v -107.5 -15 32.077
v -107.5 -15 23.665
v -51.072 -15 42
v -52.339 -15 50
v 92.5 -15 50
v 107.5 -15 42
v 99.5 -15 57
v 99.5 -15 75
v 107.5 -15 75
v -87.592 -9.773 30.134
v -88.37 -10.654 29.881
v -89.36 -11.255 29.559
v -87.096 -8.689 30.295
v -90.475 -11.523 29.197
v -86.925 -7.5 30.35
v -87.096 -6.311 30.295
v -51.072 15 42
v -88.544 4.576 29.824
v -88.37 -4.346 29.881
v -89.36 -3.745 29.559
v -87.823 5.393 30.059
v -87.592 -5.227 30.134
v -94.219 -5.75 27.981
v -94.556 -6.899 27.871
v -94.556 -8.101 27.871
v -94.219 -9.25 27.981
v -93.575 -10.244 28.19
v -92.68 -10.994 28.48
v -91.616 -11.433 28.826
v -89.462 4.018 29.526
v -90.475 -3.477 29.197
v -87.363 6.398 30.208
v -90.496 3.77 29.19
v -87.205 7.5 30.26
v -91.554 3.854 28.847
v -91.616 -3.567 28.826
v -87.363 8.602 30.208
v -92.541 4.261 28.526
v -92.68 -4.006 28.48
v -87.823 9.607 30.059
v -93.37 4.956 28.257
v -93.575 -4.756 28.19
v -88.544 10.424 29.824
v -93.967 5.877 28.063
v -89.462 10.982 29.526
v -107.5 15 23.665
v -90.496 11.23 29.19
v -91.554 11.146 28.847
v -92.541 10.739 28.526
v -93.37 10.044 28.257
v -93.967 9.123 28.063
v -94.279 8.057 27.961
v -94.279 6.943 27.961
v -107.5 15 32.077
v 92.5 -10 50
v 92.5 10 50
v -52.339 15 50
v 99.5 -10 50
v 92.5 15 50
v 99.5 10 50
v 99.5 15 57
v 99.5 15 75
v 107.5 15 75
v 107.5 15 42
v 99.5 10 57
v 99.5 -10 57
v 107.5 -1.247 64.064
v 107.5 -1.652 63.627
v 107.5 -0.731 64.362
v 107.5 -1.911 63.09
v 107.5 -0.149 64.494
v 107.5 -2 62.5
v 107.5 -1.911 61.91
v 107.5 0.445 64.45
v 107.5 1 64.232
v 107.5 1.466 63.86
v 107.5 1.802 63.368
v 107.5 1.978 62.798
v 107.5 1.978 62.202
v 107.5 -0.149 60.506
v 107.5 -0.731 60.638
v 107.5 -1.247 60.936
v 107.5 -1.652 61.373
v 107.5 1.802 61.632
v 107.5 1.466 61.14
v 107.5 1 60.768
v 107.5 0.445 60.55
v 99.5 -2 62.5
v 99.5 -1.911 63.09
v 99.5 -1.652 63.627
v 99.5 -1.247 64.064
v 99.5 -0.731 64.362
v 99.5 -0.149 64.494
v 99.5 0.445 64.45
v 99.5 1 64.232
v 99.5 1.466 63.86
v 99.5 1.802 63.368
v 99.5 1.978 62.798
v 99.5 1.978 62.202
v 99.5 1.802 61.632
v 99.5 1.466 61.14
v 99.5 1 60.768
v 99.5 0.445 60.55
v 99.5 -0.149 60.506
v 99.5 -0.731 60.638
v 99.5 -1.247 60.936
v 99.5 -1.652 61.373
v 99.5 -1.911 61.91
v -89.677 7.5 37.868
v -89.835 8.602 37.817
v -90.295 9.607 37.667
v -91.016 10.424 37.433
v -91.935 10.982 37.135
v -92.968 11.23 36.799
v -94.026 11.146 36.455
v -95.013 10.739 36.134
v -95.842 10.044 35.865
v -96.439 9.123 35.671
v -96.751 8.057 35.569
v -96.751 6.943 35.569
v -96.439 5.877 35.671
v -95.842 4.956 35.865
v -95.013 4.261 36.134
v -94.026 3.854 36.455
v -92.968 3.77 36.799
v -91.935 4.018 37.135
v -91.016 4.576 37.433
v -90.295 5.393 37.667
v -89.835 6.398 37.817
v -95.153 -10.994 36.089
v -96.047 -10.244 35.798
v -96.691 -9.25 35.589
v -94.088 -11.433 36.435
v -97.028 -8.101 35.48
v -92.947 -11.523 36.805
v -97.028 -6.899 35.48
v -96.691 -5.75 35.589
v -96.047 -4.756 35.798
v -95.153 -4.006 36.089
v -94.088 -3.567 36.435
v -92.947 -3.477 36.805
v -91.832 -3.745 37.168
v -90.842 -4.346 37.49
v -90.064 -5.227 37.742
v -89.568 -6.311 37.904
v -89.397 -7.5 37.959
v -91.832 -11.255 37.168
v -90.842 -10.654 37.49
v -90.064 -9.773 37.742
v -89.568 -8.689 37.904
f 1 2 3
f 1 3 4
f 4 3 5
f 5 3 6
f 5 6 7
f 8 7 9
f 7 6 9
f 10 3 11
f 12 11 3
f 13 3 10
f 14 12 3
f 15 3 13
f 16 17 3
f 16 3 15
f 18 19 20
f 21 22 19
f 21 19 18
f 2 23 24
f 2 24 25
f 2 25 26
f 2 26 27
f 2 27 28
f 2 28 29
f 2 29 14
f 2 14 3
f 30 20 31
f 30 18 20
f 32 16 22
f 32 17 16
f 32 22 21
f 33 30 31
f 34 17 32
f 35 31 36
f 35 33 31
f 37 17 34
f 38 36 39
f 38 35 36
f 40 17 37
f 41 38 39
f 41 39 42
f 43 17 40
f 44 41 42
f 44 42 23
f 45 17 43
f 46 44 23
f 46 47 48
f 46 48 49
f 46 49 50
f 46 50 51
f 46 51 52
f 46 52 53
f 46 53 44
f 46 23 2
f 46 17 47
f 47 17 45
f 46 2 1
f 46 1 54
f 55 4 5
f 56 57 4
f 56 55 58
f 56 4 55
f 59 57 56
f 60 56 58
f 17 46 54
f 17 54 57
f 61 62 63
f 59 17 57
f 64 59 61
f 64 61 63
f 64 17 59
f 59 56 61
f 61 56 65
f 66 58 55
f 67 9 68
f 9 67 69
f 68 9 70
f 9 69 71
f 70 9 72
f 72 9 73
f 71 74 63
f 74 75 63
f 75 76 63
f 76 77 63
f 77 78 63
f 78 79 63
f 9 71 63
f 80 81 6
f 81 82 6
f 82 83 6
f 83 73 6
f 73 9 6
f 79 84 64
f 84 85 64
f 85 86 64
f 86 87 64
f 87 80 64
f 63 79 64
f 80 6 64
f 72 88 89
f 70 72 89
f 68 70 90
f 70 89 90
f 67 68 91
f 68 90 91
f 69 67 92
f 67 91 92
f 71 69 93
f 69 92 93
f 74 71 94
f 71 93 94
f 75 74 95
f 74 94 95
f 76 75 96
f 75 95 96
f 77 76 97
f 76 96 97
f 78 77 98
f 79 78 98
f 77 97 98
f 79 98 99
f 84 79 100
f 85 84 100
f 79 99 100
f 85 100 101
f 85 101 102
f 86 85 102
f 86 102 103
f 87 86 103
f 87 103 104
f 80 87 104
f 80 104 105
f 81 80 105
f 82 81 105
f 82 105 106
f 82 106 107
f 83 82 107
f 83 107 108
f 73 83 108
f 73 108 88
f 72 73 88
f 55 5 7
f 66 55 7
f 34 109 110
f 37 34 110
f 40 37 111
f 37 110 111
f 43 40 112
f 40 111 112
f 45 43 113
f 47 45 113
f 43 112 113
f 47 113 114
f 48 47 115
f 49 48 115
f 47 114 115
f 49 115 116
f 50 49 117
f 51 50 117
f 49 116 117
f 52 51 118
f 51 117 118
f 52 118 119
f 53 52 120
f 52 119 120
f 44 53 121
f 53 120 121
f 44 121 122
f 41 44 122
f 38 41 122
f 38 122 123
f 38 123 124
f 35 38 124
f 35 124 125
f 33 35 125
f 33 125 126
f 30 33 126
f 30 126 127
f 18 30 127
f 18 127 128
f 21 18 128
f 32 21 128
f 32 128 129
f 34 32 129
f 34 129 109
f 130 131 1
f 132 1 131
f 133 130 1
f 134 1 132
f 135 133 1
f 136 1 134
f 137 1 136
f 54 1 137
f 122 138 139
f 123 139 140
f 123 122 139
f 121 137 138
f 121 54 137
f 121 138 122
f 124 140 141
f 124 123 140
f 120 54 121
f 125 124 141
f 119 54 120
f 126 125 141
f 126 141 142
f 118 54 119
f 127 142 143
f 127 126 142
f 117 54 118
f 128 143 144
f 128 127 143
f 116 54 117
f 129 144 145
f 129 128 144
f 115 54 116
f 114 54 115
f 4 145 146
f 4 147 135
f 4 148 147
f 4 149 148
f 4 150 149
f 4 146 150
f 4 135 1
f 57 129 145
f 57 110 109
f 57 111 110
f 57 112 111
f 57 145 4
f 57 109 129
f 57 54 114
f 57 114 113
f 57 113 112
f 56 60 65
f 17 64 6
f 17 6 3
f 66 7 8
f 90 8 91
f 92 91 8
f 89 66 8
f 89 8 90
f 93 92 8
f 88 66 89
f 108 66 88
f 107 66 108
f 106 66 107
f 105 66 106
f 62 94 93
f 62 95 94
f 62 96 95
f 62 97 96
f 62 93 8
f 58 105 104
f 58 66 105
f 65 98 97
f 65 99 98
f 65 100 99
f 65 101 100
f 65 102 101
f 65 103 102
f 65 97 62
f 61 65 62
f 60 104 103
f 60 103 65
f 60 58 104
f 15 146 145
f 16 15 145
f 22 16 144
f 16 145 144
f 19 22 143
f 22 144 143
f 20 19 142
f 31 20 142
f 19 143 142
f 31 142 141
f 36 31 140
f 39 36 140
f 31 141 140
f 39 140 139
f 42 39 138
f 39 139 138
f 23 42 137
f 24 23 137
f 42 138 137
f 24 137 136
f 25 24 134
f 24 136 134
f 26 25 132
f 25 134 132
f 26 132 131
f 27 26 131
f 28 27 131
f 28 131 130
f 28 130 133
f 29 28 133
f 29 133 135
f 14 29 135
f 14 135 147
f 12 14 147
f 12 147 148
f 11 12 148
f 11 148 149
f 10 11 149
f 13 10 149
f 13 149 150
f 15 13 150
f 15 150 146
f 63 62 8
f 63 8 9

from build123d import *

# Parameters (mm, degrees)
SKETCH5_W           = 215
SKETCH5_H           = 30
BOSS_EXTRUDE3_DEPTH = 50
CUT_EXTRUDE2_DEPTH  = 123.295748086
CUT_EXTRUDE3_DEPTH  = 123.295748086
SKETCH8_W           = 8
SKETCH8_H           = 30
BOSS_EXTRUDE4_DEPTH = 25
SKETCH9_W           = 7
SKETCH9_H           = 5
BOSS_EXTRUDE5_DEPTH = 7
CUT_EXTRUDE4_DEPTH  = 135.466538589
SKETCH11_R          = 2
CUT_EXTRUDE5_DEPTH  = 221.678499179
SKETCH12_R          = 3.740099061
SKETCH12_R_2        = 4.034215751
CUT_EXTRUDE6_DEPTH  = 134.295377202


with BuildPart() as part:
    # Sketch5 → Boss-Extrude3 (new body)
    with BuildSketch(Plane.XY):
        Rectangle(SKETCH5_W, SKETCH5_H)
    extrude(amount=BOSS_EXTRUDE3_DEPTH)

    # Sketch6 → Cut-Extrude2 (cut, through all)
    with BuildSketch(Plane(origin=(0, 15, 0), x_dir=(1, 0, 0), z_dir=(0, 1, 0))):
        Polygon((-107.5, -32.077014326), (-52.338722055, -50), (-107.5, -50), align=None)
    extrude(amount=-CUT_EXTRUDE2_DEPTH, mode=Mode.SUBTRACT)

    # Sketch7 → Cut-Extrude3 (cut, through all)
    with BuildSketch(Plane(origin=(0, 15, 0), x_dir=(1, 0, 0), z_dir=(0, 1, 0))):
        Polygon((107.5, -42), (-51.071646532, -42), (-107.5, -23.665316532), (-107.5, 0), (107.5, 0), align=None)
    extrude(amount=-CUT_EXTRUDE3_DEPTH, mode=Mode.SUBTRACT)

    # Sketch8 → Boss-Extrude4 (add)
    with BuildSketch(Plane.XY.offset(50)):
        with Locations((103.5, 0)):
            Rectangle(SKETCH8_W, SKETCH8_H)
    extrude(amount=BOSS_EXTRUDE4_DEPTH)

    # Sketch9 → Boss-Extrude5 (add)
    with BuildSketch(Plane.ZY.offset(-99.5)):
        with Locations((53.5, -12.5)):
            Rectangle(SKETCH9_W, SKETCH9_H)
        with Locations((53.5, 12.5)):
            Rectangle(SKETCH9_W, SKETCH9_H)
    extrude(amount=BOSS_EXTRUDE5_DEPTH)

    # Sketch10 → Cut-Extrude4 (cut, through all)
    with BuildSketch(Plane.XZ.offset(15)):
        Polygon((92.5, 50), (99.5, 57), (92.5, 57), align=None)
    extrude(amount=-CUT_EXTRUDE4_DEPTH, mode=Mode.SUBTRACT)

    # Sketch11 → Cut-Extrude5 (cut, through all)
    with BuildSketch(Plane.ZY.offset(-99.5)):
        with Locations(Location((62.5, 0, 0), (0, 0, 270))):
            Circle(SKETCH11_R)
    extrude(amount=-CUT_EXTRUDE5_DEPTH, mode=Mode.SUBTRACT)

    # Sketch12 → Cut-Extrude6 (cut, through all)
    with BuildSketch(Plane(origin=(-19.692534532, 0, 60.607389333), x_dir=(0.9510565162951554, 0, 0.3090169943749418), z_dir=(-0.3090169943749418, 0, 0.9510565162951554))):
        with Locations((-77.326232946, 7.5)):
            Circle(SKETCH12_R)
        with Locations((-77.326232946, -7.5)):
            Circle(SKETCH12_R_2)
    extrude(amount=-CUT_EXTRUDE6_DEPTH, mode=Mode.SUBTRACT)


solid = part.part
